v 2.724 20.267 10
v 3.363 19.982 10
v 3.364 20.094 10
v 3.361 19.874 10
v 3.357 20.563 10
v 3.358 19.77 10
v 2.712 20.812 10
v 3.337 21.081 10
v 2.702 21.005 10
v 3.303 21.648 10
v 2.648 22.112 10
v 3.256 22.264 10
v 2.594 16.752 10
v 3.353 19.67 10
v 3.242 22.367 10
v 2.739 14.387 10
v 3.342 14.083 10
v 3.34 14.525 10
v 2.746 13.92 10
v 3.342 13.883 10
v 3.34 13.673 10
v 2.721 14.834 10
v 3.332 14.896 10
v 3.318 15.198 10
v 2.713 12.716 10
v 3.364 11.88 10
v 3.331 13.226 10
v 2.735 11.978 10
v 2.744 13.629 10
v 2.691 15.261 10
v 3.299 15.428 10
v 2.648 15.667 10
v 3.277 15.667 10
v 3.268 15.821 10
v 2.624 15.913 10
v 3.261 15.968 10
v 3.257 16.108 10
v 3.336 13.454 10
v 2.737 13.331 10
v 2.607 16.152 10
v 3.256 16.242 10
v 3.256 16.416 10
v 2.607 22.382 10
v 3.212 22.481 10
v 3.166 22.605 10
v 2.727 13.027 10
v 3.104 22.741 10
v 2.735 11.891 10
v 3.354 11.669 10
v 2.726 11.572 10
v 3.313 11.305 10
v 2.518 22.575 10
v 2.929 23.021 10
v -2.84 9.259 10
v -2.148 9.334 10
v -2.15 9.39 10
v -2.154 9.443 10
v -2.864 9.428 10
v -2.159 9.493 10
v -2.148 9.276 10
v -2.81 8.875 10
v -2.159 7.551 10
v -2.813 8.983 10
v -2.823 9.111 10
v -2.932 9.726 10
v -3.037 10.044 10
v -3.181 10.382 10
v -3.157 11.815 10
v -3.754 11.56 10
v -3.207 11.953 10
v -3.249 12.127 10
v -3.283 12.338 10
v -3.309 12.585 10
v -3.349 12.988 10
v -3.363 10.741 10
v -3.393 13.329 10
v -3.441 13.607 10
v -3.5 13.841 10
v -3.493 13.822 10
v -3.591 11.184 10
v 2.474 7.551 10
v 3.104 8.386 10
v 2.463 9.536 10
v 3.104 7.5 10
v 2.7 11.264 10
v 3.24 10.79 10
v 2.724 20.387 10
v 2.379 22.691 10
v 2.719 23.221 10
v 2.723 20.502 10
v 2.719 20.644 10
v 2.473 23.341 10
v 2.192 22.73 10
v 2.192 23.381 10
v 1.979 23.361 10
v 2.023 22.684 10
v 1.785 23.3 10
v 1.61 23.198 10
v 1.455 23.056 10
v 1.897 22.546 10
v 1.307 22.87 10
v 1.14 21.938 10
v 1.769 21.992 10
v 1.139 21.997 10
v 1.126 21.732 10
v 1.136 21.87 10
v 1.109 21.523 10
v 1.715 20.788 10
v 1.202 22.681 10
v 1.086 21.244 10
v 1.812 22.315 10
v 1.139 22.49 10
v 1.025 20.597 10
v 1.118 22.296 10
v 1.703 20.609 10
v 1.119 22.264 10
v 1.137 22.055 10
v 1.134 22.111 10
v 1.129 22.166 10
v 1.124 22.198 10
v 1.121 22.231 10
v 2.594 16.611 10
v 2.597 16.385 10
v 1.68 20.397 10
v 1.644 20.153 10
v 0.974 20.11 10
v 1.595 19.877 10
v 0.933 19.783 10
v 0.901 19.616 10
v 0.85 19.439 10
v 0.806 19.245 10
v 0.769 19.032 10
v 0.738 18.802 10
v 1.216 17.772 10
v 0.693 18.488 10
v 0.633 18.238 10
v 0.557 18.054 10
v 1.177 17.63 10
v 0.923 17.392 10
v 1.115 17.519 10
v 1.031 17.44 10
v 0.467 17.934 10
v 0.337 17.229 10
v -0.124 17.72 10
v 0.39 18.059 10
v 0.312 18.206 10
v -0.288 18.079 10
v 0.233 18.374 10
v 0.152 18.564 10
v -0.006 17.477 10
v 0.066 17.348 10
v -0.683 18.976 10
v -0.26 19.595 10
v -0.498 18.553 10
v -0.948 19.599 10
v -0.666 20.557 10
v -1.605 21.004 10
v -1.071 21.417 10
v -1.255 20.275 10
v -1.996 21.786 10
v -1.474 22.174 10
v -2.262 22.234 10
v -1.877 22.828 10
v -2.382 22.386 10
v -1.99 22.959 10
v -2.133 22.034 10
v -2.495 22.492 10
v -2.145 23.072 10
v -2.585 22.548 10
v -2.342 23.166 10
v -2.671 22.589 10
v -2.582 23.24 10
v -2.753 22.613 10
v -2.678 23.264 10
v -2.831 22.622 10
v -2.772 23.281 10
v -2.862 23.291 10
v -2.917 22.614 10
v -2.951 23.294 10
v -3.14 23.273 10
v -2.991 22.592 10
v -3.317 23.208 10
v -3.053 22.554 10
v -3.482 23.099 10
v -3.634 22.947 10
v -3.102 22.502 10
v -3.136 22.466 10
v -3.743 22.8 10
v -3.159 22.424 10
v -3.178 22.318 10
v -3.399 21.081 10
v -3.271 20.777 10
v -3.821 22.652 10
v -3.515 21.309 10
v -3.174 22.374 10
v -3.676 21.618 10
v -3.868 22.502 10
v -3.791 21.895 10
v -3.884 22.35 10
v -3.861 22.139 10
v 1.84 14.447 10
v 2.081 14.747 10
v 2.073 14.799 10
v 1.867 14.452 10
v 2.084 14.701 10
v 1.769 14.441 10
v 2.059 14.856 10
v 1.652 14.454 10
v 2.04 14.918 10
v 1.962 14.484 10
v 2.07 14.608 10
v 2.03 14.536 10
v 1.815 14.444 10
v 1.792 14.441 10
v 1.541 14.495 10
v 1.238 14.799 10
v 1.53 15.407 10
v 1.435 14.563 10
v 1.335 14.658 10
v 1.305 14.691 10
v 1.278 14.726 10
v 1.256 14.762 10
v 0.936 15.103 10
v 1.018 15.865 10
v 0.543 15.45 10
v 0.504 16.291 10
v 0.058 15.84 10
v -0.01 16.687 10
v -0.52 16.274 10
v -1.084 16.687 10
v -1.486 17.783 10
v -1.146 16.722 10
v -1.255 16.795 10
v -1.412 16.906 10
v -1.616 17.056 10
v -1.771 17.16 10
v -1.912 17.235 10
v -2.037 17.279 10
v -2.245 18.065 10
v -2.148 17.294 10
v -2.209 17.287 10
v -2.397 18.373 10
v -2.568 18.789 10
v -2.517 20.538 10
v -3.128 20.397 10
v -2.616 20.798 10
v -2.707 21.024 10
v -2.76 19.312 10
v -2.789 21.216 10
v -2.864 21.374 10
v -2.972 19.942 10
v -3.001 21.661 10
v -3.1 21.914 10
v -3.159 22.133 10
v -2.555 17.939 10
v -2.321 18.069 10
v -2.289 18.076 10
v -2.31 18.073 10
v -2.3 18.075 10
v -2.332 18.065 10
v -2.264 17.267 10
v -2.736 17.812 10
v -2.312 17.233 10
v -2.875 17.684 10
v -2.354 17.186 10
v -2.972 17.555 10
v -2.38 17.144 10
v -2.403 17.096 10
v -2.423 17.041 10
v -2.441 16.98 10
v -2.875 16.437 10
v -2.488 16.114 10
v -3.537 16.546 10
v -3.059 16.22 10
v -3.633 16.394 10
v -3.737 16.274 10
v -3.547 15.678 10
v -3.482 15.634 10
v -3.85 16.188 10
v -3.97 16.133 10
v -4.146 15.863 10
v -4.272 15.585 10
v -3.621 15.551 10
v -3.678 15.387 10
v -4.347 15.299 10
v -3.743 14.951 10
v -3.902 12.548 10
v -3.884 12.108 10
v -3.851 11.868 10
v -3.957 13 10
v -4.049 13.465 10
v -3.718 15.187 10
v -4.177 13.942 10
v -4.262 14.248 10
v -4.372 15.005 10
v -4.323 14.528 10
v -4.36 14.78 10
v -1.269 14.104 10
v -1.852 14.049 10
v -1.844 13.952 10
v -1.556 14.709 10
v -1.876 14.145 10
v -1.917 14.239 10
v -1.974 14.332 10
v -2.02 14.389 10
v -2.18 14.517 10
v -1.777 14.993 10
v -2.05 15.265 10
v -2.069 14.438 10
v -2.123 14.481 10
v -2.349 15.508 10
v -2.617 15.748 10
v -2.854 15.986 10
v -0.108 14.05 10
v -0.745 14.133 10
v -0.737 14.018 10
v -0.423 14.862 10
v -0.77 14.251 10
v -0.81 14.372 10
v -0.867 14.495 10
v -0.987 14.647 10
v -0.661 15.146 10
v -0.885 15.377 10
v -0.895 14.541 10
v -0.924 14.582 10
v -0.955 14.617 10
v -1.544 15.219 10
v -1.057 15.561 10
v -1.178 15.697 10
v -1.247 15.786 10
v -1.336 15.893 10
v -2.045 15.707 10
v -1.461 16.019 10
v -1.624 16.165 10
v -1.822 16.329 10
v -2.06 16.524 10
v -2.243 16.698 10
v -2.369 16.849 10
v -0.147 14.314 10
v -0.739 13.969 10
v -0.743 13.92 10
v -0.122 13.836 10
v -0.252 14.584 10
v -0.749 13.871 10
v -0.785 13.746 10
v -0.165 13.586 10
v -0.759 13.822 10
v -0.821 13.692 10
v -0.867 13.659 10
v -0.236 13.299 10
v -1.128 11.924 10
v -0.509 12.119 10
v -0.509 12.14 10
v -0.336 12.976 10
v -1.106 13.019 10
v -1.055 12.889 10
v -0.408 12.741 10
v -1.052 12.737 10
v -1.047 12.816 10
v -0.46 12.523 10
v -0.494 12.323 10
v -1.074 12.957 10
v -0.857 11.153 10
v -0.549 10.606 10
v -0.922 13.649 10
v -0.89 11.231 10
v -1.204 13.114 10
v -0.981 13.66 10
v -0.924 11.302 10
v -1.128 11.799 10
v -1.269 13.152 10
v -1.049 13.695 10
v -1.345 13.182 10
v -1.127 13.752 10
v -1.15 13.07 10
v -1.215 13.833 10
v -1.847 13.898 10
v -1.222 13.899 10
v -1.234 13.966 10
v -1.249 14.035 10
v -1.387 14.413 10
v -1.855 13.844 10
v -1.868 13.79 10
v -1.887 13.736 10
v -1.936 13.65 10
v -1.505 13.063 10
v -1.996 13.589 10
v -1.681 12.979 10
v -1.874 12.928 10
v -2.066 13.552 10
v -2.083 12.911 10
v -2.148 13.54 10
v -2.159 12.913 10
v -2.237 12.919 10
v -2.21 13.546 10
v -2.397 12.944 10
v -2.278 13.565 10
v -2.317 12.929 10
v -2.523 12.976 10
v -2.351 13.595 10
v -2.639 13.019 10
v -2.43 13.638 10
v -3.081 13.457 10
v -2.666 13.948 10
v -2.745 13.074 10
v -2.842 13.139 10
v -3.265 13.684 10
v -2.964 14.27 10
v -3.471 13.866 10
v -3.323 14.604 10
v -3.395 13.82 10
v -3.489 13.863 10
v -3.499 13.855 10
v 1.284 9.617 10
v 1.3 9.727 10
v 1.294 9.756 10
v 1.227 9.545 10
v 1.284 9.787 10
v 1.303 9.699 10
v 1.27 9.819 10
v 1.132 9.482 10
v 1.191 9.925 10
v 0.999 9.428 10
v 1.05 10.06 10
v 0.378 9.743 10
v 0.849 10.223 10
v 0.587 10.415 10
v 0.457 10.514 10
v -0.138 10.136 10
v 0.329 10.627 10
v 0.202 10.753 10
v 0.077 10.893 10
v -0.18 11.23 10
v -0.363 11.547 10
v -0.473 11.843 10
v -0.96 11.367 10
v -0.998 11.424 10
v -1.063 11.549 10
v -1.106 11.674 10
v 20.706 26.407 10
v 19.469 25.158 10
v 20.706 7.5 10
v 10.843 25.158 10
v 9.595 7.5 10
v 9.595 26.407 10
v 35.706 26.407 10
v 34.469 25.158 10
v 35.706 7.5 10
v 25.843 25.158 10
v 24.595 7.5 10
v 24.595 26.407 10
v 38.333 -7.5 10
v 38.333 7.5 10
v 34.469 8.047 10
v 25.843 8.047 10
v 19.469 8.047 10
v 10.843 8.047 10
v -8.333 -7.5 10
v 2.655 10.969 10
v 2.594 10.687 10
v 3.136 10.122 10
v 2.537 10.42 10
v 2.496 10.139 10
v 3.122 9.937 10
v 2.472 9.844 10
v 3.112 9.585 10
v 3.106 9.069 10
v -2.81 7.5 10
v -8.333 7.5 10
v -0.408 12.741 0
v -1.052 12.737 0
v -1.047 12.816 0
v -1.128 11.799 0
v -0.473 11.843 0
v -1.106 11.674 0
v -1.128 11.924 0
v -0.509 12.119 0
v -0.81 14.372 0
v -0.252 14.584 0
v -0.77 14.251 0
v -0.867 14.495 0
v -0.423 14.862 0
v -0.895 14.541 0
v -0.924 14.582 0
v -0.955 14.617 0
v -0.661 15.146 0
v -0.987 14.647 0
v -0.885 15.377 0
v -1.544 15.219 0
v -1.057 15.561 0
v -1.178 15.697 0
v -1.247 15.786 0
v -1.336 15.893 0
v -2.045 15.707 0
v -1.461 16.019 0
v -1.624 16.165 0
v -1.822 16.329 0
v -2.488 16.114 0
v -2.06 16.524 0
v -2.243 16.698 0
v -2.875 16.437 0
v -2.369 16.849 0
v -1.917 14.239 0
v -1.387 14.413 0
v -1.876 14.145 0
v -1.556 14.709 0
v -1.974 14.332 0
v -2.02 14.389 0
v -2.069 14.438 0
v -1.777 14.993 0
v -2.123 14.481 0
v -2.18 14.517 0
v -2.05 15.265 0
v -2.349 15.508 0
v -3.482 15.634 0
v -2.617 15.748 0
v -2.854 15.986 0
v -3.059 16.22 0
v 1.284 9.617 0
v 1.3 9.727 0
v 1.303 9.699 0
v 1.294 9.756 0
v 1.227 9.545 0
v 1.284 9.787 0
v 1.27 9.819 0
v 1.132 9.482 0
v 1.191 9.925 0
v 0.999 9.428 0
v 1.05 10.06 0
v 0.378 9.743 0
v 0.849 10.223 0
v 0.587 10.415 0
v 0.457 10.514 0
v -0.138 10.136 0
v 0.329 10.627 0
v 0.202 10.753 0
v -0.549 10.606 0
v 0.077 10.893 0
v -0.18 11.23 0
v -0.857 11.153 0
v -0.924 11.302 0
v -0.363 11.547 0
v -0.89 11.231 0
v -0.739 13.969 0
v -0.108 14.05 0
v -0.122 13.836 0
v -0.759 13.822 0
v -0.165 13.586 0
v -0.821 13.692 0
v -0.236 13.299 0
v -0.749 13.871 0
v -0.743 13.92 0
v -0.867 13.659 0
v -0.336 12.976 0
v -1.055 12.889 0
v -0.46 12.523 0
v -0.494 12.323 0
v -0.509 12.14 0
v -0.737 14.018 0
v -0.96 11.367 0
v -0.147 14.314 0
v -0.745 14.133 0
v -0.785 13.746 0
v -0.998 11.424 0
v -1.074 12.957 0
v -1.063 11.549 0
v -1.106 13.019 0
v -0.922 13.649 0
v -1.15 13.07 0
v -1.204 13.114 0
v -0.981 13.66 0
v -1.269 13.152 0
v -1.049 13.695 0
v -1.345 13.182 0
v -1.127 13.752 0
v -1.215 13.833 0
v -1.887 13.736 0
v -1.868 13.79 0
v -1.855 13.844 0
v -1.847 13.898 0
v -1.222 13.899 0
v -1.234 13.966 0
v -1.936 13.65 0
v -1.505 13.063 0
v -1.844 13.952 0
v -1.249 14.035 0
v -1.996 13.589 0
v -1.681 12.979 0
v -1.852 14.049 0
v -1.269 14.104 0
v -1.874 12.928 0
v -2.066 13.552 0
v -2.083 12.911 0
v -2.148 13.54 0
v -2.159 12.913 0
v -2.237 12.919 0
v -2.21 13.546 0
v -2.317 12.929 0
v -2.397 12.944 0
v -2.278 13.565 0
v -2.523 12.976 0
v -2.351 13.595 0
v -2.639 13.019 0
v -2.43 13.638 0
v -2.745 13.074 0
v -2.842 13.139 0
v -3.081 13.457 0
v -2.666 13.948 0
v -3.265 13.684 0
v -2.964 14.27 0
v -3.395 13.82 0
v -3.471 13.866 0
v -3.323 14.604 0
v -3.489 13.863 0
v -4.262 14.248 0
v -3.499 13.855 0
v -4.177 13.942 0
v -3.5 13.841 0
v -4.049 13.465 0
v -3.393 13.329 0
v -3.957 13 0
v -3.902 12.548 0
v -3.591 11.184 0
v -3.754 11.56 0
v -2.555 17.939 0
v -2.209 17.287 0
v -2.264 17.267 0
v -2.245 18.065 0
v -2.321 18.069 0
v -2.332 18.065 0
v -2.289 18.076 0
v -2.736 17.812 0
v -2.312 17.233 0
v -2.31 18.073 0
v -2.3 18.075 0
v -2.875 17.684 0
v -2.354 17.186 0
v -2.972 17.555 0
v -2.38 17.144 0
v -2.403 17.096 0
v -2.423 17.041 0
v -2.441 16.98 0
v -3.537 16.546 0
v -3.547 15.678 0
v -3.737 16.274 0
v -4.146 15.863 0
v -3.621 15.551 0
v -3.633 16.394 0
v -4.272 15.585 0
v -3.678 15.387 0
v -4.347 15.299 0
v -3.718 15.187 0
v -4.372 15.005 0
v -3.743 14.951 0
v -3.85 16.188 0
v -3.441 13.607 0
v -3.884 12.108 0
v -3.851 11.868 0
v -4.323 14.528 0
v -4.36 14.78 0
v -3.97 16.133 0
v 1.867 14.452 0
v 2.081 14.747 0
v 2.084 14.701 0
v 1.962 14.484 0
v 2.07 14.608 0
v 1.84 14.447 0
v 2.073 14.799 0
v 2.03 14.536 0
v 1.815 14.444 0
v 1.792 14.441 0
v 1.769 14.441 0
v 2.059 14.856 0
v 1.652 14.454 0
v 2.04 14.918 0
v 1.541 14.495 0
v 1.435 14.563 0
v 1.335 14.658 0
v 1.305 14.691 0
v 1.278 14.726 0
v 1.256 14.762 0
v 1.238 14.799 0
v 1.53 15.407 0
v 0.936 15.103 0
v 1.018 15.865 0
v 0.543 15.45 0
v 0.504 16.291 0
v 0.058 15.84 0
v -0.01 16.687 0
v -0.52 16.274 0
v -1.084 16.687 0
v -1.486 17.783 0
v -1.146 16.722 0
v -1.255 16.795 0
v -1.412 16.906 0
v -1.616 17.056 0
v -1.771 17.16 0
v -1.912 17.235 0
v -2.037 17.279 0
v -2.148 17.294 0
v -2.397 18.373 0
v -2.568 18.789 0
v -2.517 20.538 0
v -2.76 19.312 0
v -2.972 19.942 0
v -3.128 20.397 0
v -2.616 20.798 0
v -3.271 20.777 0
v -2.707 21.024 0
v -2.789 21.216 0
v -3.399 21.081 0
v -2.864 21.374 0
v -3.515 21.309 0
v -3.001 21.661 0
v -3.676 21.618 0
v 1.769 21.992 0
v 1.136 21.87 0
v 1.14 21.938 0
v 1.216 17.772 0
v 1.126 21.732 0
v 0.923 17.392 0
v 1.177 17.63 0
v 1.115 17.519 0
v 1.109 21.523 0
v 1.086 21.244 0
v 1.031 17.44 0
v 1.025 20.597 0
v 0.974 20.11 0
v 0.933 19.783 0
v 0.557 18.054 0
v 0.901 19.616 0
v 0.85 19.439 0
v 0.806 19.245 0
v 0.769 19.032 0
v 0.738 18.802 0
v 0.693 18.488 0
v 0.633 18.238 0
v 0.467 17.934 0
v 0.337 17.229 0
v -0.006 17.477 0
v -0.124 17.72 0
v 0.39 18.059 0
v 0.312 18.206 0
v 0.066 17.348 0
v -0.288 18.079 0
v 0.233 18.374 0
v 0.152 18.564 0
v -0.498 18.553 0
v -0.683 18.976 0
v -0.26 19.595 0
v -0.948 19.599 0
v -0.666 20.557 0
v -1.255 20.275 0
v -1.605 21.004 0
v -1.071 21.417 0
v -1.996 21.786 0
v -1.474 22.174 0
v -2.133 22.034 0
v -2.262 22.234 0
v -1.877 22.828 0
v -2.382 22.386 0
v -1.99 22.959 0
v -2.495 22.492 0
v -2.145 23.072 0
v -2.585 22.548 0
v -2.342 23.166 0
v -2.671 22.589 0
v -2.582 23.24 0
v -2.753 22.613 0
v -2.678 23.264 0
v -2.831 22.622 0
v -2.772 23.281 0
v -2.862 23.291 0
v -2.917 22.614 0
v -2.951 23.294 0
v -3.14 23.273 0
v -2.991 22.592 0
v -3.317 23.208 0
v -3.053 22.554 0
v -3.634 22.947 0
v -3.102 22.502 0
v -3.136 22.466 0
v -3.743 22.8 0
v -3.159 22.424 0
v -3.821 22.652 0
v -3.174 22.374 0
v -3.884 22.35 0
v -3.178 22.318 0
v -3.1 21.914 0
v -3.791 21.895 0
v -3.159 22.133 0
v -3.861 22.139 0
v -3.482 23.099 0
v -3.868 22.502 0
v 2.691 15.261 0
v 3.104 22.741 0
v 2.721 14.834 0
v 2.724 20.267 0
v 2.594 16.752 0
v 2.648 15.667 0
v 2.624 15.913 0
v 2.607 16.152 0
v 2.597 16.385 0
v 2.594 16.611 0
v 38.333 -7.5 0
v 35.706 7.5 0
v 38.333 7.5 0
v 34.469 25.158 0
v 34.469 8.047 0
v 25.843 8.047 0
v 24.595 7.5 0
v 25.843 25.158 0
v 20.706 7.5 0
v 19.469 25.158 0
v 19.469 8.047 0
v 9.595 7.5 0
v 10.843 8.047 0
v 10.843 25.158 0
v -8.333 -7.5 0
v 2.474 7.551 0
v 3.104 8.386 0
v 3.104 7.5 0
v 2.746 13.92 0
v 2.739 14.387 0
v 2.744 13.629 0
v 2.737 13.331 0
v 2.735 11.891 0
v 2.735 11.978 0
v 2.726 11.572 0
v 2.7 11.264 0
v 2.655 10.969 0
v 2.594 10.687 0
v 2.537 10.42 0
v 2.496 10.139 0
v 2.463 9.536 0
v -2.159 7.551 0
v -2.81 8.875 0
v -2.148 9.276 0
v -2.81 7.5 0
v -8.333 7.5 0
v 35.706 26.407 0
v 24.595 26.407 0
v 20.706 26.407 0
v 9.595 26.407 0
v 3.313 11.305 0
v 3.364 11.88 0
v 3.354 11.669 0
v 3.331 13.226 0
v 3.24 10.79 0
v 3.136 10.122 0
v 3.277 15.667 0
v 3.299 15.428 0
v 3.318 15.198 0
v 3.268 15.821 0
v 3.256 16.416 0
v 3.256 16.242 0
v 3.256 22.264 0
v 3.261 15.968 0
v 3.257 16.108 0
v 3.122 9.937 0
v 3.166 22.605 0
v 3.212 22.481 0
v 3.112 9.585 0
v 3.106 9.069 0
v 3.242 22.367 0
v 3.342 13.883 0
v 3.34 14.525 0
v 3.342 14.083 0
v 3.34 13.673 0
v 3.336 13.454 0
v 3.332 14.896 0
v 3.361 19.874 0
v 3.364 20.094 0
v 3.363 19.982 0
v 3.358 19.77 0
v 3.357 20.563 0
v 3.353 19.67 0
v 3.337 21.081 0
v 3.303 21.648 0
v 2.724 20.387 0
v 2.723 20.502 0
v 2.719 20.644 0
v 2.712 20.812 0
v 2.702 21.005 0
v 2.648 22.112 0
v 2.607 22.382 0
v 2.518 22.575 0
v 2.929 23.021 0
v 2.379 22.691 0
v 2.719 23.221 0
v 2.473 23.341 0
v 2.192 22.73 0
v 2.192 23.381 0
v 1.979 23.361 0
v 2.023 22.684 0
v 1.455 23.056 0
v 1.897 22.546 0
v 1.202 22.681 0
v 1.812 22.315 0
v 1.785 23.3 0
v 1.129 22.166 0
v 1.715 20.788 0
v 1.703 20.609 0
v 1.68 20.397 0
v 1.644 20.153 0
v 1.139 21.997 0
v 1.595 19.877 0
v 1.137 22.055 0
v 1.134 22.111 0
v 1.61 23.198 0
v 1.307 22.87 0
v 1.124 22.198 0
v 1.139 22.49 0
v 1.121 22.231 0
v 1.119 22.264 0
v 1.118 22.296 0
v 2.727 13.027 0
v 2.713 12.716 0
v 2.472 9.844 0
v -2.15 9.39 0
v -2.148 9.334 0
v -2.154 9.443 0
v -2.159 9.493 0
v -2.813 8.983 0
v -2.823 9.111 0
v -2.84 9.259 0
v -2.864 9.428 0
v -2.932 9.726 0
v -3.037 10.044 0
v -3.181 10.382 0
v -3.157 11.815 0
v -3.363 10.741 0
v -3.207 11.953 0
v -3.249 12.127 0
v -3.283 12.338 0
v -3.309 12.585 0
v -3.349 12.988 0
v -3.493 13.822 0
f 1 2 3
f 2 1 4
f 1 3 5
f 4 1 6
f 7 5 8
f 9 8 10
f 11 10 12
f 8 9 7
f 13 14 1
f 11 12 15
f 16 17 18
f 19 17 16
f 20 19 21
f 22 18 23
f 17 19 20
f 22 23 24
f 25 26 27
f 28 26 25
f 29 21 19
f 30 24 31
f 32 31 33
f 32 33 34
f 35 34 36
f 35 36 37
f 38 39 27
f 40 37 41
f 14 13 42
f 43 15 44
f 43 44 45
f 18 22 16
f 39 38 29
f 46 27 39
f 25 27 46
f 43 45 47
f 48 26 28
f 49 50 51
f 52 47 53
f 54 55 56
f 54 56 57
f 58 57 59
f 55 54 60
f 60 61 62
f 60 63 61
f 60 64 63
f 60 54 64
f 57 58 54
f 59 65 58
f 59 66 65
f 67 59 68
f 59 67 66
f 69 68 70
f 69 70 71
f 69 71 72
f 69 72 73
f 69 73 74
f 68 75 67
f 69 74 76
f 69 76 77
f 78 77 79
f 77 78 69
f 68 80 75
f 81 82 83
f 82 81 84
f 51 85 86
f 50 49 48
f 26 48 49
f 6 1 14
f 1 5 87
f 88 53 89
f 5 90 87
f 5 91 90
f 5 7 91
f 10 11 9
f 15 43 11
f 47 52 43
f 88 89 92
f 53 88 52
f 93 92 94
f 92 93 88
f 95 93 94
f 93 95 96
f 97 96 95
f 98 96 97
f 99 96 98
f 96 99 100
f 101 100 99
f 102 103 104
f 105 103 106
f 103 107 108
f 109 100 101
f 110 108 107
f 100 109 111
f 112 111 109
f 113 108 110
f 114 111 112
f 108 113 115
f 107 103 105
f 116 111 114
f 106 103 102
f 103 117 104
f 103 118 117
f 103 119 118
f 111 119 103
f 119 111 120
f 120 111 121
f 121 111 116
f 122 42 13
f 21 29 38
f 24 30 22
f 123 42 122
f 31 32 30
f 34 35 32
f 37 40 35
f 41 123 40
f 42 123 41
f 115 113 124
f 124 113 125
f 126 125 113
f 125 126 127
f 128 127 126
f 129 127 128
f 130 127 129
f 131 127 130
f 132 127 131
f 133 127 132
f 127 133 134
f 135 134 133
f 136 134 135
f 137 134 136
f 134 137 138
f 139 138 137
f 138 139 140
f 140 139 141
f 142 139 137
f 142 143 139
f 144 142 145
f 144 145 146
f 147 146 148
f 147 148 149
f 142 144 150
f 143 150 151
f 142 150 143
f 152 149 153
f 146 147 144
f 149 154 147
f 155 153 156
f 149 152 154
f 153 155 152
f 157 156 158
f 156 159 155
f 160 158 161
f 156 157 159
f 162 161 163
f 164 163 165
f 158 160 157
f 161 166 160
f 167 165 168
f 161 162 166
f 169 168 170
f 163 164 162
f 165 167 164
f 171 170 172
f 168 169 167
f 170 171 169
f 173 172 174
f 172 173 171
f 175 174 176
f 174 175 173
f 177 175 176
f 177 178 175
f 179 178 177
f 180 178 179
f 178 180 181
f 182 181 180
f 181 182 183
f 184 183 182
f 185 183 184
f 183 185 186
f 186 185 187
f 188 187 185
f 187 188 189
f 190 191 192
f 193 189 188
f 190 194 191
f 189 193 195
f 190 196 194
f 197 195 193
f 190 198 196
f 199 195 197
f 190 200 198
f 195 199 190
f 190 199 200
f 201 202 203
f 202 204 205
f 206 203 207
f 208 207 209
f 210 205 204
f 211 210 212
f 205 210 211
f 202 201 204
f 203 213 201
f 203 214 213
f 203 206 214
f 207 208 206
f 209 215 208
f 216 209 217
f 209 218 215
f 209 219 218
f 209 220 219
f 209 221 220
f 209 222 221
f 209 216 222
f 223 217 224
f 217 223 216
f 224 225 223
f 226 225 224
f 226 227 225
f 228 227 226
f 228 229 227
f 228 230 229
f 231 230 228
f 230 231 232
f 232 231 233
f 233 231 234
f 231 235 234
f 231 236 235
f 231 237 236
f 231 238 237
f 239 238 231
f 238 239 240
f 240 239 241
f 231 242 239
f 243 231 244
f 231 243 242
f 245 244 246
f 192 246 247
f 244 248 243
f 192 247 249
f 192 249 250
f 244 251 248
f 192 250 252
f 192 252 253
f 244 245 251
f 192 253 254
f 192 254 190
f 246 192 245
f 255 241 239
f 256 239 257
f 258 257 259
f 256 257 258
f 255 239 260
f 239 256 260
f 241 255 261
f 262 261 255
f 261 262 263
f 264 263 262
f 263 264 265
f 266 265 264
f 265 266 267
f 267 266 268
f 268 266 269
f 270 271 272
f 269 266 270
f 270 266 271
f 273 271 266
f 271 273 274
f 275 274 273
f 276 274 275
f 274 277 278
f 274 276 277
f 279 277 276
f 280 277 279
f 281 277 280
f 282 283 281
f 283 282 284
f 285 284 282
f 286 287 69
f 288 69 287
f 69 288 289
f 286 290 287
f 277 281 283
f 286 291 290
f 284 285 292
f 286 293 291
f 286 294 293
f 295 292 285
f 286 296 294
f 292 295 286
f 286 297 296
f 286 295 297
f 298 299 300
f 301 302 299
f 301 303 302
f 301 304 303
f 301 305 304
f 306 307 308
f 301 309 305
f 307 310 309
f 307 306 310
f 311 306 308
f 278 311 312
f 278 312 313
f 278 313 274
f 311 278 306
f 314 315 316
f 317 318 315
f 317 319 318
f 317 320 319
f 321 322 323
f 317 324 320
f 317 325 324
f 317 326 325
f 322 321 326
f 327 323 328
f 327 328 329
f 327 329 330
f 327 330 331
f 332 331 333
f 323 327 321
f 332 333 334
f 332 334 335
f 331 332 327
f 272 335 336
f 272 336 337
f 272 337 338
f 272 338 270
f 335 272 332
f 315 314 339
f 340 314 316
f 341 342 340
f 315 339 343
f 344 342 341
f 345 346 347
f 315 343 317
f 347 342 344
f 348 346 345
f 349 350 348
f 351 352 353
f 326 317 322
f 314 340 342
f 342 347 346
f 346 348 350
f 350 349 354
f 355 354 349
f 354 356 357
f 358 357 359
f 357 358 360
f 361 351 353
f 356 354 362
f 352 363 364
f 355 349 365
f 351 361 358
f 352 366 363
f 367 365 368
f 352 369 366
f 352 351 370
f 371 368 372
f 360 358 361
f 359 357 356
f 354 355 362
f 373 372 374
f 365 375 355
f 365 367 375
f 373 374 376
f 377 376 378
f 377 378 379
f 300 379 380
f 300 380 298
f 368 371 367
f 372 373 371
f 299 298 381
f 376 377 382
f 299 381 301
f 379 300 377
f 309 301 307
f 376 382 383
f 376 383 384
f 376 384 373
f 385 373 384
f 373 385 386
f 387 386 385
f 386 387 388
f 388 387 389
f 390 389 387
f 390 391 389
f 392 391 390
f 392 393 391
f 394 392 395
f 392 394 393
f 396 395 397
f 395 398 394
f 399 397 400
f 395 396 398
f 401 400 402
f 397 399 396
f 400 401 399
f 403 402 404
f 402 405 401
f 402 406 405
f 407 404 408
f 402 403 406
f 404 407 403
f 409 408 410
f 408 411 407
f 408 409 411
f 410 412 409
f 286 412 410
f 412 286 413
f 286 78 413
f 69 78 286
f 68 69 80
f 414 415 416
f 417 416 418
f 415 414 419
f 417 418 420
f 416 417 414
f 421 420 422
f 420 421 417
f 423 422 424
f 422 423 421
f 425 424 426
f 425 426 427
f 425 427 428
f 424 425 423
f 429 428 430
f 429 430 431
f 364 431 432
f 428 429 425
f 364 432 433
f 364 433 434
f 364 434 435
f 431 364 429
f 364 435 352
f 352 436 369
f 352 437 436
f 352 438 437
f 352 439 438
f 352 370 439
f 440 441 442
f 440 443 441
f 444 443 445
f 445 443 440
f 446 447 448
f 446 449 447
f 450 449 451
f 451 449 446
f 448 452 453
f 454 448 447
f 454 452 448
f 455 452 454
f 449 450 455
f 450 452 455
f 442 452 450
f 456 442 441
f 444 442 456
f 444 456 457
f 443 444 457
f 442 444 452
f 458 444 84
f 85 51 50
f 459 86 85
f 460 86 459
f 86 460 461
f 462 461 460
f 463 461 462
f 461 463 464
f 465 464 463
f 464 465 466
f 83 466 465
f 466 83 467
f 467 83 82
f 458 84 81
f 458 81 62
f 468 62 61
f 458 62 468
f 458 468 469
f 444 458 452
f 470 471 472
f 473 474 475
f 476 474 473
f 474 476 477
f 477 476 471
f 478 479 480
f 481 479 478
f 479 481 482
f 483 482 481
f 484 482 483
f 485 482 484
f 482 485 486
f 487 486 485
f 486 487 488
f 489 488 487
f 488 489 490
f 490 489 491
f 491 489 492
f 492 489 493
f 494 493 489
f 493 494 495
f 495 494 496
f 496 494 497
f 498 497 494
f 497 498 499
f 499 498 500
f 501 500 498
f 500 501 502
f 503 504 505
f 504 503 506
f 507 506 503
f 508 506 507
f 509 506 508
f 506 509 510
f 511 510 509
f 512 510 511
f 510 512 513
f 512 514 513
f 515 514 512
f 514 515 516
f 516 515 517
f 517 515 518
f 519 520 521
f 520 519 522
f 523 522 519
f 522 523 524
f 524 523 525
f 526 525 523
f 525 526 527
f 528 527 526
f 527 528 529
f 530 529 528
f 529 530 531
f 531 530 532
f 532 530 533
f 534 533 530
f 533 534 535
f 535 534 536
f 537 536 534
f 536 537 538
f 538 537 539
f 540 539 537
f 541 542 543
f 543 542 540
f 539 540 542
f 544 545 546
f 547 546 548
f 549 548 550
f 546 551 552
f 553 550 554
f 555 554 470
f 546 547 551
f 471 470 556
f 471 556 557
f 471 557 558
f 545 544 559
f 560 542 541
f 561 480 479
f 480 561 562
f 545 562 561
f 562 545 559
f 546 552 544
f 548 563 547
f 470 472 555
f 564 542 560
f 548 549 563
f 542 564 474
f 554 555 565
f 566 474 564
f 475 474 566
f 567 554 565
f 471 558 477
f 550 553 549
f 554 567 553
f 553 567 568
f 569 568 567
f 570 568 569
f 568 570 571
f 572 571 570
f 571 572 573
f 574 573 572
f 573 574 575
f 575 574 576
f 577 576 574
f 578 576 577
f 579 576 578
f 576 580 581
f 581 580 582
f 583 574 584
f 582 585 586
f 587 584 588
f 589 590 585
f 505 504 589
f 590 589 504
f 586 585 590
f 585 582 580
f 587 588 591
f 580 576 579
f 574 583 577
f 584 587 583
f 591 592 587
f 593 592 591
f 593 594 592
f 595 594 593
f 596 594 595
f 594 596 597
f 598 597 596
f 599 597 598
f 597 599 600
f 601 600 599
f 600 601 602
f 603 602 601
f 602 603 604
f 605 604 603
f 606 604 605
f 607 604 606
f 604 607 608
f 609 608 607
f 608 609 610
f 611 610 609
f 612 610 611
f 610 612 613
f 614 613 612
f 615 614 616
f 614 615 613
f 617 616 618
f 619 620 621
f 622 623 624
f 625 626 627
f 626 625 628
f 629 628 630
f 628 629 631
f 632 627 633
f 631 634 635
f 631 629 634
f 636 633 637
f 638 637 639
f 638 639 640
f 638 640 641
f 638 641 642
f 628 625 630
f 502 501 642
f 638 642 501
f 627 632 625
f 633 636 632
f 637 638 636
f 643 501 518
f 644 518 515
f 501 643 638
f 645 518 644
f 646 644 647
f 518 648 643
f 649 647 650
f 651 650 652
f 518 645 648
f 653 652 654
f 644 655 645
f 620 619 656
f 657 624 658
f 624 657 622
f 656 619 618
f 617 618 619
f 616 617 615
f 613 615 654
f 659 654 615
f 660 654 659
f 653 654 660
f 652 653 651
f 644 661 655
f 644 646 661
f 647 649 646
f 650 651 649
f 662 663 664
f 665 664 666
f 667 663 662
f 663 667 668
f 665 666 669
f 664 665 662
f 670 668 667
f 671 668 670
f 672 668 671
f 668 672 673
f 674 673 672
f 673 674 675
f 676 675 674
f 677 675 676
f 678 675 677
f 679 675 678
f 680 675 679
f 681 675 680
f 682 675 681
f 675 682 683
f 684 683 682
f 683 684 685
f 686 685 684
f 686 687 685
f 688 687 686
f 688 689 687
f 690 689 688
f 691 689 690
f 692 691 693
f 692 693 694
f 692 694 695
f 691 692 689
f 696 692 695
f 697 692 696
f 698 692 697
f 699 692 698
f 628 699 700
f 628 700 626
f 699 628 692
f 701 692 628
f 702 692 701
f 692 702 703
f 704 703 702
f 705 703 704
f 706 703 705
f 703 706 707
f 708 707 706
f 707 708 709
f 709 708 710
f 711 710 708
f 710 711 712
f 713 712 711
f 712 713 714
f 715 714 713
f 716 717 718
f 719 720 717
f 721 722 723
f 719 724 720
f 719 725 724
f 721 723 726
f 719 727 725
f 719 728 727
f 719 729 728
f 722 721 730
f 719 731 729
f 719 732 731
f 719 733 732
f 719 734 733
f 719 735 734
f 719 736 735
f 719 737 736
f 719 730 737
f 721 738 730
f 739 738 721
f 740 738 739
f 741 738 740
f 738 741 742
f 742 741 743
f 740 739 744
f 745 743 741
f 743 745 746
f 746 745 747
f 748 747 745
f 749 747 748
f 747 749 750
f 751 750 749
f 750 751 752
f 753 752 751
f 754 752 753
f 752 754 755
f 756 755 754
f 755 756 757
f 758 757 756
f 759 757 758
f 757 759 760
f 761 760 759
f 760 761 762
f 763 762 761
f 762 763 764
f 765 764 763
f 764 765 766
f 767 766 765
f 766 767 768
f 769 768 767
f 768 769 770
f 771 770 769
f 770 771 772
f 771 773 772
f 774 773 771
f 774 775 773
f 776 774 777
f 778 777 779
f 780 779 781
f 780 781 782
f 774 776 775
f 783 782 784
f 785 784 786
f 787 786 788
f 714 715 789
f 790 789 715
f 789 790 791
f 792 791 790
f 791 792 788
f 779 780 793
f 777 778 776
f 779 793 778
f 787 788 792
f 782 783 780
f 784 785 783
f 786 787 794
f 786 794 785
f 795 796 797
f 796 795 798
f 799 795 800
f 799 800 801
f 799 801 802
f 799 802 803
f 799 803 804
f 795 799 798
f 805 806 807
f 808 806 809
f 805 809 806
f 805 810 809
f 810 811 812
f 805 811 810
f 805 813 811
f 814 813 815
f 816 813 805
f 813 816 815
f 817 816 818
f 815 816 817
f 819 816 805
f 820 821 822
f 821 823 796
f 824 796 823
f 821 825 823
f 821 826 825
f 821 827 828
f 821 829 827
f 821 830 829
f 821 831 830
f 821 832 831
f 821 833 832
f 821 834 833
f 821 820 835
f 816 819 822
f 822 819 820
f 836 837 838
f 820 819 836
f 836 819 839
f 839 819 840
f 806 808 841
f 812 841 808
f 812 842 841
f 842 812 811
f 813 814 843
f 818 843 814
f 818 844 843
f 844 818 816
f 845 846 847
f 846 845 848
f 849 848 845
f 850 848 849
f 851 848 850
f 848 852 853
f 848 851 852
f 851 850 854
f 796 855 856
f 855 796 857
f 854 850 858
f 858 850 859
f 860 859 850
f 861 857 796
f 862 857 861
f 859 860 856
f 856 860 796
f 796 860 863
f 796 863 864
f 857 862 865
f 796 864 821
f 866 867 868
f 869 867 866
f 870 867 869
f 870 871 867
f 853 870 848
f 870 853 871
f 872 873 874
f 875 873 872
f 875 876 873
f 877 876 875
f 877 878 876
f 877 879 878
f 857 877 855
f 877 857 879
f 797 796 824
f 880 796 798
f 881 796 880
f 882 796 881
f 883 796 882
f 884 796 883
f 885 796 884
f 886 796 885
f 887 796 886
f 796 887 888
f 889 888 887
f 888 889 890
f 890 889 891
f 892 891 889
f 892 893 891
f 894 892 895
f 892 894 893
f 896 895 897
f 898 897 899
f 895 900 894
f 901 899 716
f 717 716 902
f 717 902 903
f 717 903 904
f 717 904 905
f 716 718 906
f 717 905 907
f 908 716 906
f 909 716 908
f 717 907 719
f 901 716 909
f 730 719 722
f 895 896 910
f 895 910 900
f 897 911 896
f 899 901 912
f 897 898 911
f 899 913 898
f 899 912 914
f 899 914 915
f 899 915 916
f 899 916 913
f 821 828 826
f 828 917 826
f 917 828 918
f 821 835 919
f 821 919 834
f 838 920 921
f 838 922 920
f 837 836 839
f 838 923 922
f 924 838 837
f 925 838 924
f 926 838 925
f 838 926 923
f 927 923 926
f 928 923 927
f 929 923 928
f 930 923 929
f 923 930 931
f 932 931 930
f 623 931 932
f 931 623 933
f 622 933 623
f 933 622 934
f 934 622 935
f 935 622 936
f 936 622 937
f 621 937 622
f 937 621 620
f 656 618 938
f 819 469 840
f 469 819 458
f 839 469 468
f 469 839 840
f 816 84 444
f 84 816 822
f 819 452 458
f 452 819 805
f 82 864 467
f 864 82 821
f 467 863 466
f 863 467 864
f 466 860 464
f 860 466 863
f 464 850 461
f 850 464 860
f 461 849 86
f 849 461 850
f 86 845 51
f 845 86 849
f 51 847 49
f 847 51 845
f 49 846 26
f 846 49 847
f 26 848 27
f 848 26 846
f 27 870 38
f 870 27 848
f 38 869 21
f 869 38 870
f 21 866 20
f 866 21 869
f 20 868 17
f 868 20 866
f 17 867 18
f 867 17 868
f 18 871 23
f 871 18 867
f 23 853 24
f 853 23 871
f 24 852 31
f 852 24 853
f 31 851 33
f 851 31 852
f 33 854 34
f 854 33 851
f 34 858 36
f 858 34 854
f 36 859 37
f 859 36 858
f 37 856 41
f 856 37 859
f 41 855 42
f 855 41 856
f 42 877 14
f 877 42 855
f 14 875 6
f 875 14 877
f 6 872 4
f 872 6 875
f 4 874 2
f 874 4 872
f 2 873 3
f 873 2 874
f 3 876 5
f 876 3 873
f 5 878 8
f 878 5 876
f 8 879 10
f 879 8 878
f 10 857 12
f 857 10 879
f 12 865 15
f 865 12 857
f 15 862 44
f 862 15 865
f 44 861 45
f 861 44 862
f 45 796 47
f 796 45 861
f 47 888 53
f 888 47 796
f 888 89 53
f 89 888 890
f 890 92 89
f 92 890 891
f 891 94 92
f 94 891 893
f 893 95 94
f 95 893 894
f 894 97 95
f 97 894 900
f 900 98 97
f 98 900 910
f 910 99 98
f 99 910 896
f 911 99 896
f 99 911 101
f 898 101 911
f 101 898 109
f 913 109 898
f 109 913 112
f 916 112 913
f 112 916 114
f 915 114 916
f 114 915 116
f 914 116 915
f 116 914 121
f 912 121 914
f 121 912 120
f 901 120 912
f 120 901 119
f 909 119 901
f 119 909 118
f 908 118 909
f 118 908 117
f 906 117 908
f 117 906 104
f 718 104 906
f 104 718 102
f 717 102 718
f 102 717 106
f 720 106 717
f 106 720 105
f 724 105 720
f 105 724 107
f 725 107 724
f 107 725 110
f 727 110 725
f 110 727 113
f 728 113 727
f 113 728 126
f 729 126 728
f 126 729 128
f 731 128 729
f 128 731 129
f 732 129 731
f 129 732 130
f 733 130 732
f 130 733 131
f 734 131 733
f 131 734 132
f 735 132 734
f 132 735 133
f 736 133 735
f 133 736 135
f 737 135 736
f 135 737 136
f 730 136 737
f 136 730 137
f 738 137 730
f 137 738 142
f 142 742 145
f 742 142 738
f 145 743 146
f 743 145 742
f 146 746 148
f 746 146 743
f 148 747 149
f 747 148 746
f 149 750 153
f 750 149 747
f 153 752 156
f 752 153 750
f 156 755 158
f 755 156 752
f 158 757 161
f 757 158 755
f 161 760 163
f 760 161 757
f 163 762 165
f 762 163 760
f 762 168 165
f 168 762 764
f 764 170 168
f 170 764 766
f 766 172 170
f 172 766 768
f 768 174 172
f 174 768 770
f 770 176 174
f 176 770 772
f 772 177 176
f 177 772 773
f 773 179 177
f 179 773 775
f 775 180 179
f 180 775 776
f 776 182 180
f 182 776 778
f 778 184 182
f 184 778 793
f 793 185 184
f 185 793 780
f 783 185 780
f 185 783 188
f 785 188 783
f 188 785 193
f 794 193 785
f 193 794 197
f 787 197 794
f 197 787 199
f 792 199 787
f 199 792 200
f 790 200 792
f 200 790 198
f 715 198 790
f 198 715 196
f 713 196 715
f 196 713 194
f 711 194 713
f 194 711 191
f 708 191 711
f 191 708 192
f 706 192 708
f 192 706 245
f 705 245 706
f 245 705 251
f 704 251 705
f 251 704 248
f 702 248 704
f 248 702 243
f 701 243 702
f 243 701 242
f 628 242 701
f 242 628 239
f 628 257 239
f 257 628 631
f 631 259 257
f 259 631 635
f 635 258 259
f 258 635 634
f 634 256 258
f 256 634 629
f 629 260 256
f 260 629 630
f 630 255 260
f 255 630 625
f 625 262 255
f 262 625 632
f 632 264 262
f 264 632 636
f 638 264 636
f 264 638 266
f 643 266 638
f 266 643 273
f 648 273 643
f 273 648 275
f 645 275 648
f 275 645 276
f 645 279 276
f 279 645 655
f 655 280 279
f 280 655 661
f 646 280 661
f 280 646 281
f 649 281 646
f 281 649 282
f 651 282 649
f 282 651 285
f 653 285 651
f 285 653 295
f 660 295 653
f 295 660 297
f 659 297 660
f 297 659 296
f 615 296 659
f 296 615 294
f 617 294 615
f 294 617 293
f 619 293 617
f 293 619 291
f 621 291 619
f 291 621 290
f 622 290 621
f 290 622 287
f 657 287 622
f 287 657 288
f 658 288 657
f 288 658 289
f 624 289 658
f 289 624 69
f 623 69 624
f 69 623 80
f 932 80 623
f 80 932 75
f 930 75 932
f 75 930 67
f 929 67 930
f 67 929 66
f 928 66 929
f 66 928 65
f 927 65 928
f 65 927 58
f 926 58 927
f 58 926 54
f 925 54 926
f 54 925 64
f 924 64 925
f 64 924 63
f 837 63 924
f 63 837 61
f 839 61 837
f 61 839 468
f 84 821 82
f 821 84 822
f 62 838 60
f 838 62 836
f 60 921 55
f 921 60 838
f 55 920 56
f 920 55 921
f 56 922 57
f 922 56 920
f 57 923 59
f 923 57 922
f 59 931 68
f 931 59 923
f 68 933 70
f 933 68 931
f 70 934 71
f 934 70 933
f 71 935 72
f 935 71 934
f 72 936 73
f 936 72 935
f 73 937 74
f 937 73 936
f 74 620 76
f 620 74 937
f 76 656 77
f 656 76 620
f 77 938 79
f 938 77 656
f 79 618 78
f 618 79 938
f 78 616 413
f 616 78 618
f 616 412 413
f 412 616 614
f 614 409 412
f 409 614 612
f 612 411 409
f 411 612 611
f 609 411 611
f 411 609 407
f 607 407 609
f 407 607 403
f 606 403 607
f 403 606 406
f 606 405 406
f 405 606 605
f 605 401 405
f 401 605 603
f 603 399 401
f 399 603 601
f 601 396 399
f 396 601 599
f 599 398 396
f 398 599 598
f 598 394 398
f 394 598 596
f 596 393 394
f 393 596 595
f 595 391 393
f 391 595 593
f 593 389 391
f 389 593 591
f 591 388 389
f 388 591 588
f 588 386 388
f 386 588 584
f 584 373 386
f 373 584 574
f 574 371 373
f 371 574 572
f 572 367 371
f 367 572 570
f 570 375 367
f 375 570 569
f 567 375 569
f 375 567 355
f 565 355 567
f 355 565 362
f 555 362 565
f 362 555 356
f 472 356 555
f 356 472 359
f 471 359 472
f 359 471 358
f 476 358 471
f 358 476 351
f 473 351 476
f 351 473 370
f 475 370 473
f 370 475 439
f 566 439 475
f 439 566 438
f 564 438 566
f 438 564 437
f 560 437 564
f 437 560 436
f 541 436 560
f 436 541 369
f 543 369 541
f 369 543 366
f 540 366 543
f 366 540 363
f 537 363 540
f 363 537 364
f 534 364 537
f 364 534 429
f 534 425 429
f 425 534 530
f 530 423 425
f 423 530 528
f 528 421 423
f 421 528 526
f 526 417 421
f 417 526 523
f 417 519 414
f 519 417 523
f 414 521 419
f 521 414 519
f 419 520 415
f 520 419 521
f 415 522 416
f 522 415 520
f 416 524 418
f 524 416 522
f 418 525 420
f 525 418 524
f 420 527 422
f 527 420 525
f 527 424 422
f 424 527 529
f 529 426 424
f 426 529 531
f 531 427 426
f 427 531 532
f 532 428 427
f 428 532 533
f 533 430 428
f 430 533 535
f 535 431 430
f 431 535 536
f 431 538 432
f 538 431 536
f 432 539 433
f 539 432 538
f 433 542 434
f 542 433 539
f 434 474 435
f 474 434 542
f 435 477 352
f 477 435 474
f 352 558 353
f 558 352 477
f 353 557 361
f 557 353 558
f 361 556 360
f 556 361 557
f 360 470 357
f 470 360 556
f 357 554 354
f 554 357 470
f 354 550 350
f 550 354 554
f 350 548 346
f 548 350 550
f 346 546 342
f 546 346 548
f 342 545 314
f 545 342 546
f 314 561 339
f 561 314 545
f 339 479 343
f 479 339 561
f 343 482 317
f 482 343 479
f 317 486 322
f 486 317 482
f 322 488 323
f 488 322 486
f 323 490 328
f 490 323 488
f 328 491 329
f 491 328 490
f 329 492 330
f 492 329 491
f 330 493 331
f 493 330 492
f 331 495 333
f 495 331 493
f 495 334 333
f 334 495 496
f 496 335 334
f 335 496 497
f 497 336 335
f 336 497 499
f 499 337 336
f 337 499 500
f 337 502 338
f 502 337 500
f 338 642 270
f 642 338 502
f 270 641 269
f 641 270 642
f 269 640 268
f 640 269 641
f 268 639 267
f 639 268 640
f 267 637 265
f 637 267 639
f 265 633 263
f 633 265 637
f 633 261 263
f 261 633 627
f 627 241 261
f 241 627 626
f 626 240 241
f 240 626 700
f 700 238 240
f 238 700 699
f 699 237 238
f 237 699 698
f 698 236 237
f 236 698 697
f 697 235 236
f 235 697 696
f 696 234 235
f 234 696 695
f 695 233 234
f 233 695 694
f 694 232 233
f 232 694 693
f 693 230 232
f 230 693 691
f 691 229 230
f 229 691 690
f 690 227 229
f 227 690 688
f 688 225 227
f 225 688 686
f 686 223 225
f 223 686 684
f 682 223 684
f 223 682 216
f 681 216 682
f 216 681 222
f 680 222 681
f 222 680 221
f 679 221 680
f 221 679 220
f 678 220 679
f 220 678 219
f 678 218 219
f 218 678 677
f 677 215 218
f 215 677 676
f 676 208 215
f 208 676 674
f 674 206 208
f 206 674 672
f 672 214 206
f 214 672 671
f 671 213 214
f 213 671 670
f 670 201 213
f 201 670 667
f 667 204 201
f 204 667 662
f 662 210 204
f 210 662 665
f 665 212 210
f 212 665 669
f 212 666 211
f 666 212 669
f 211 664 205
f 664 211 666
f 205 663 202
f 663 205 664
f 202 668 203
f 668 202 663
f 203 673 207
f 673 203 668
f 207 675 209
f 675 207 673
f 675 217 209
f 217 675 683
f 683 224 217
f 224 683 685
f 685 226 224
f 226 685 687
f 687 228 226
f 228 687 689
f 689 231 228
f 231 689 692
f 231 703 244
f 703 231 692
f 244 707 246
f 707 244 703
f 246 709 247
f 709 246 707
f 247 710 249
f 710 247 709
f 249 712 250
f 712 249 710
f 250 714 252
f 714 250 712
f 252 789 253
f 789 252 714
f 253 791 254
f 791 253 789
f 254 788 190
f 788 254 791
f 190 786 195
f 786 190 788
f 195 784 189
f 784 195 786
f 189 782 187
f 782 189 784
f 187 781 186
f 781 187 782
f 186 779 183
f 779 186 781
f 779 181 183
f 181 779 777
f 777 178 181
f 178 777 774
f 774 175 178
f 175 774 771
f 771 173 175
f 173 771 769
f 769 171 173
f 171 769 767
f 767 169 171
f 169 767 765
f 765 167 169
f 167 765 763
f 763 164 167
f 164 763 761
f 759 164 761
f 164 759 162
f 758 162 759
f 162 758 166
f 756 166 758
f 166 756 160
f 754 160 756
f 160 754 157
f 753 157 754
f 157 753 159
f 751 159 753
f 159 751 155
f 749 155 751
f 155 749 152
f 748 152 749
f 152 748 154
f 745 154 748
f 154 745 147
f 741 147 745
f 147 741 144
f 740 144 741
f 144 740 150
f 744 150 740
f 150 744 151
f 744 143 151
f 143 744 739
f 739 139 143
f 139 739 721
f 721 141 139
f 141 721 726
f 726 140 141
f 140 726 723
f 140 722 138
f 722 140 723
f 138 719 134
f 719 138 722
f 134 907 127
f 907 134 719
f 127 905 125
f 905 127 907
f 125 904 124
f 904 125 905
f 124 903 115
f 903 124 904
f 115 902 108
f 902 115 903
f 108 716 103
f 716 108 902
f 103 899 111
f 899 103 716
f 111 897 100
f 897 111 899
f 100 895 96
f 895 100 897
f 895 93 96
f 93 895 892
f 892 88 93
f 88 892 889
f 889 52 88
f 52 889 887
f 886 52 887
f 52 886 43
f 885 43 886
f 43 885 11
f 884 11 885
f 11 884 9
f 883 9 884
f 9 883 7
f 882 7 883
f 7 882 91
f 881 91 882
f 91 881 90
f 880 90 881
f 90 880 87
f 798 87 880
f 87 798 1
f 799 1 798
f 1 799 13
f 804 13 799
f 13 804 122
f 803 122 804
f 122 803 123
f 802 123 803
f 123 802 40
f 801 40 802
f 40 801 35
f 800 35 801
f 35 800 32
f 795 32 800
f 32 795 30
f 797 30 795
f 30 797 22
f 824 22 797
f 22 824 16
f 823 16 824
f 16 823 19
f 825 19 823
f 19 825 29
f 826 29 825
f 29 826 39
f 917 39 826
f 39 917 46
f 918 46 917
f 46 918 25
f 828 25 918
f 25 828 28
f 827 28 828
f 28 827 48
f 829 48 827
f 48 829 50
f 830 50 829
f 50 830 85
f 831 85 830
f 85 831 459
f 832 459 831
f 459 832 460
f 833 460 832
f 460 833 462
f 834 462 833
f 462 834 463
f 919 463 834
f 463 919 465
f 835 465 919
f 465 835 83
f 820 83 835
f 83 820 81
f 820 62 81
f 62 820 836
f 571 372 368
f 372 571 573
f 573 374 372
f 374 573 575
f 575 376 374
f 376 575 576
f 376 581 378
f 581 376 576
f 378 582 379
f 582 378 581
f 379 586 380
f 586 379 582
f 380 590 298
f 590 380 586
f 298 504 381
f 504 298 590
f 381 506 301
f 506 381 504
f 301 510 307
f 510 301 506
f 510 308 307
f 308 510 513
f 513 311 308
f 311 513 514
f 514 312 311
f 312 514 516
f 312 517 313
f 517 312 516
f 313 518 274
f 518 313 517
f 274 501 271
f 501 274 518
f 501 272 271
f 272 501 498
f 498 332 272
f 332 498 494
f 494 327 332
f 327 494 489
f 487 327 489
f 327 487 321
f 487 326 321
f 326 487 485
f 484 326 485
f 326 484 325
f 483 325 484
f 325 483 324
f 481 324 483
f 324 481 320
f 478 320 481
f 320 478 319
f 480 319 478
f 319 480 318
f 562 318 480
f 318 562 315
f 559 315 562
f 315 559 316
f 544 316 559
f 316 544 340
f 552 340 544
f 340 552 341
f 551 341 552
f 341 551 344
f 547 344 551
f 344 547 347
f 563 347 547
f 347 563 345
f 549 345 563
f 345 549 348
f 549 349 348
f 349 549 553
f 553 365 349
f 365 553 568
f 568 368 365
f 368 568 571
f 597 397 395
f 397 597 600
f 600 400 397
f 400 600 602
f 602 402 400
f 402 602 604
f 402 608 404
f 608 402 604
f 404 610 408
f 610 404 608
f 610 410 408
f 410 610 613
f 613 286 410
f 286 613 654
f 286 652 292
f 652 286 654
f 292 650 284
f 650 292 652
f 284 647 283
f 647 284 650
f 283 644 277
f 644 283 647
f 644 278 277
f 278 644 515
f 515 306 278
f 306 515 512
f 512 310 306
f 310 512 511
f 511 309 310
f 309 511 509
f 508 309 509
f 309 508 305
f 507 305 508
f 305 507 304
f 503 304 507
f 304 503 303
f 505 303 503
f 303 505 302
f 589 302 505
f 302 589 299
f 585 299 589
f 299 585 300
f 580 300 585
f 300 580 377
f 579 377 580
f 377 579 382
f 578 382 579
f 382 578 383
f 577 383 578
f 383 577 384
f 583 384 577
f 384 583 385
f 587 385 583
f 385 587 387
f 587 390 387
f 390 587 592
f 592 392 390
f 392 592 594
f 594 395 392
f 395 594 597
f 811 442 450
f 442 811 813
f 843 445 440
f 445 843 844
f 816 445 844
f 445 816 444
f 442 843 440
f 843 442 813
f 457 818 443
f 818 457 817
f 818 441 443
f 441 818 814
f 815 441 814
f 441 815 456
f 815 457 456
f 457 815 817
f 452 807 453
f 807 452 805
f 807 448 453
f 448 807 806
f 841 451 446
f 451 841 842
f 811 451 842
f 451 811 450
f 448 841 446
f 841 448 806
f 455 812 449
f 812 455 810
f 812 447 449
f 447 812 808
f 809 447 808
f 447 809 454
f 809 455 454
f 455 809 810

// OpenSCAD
// LetterBlock.scad - Basic usage of text() and linear_extrude()

// Module instantiation
//LetterBlock("H");

// Module definition.
// size=30 defines an optional parameter with a default value.
module LetterBlock(letter, size=30) {
        translate([0,0,size/6]) cube([size/1.8,size/2,size/3], center=true);
        translate([0,size/4-size/50,0]) {
            // convexity is needed for correct preview
            // since characters can be highly concave
            linear_extrude(height=size/3, convexity=4)
                text(letter, 
                     size=size*16/30,
                     font="Segoe UI Emoji",
                     halign="center",
                     valign="bottom");
    }
}

module WordBlock(text, size=30) {
  for (i=[0:len(text)-1]) {
    c=text[i];
    translate([i*size/2,0,0]) LetterBlock(c);
  }
}

WordBlock("✌👍🤓");
